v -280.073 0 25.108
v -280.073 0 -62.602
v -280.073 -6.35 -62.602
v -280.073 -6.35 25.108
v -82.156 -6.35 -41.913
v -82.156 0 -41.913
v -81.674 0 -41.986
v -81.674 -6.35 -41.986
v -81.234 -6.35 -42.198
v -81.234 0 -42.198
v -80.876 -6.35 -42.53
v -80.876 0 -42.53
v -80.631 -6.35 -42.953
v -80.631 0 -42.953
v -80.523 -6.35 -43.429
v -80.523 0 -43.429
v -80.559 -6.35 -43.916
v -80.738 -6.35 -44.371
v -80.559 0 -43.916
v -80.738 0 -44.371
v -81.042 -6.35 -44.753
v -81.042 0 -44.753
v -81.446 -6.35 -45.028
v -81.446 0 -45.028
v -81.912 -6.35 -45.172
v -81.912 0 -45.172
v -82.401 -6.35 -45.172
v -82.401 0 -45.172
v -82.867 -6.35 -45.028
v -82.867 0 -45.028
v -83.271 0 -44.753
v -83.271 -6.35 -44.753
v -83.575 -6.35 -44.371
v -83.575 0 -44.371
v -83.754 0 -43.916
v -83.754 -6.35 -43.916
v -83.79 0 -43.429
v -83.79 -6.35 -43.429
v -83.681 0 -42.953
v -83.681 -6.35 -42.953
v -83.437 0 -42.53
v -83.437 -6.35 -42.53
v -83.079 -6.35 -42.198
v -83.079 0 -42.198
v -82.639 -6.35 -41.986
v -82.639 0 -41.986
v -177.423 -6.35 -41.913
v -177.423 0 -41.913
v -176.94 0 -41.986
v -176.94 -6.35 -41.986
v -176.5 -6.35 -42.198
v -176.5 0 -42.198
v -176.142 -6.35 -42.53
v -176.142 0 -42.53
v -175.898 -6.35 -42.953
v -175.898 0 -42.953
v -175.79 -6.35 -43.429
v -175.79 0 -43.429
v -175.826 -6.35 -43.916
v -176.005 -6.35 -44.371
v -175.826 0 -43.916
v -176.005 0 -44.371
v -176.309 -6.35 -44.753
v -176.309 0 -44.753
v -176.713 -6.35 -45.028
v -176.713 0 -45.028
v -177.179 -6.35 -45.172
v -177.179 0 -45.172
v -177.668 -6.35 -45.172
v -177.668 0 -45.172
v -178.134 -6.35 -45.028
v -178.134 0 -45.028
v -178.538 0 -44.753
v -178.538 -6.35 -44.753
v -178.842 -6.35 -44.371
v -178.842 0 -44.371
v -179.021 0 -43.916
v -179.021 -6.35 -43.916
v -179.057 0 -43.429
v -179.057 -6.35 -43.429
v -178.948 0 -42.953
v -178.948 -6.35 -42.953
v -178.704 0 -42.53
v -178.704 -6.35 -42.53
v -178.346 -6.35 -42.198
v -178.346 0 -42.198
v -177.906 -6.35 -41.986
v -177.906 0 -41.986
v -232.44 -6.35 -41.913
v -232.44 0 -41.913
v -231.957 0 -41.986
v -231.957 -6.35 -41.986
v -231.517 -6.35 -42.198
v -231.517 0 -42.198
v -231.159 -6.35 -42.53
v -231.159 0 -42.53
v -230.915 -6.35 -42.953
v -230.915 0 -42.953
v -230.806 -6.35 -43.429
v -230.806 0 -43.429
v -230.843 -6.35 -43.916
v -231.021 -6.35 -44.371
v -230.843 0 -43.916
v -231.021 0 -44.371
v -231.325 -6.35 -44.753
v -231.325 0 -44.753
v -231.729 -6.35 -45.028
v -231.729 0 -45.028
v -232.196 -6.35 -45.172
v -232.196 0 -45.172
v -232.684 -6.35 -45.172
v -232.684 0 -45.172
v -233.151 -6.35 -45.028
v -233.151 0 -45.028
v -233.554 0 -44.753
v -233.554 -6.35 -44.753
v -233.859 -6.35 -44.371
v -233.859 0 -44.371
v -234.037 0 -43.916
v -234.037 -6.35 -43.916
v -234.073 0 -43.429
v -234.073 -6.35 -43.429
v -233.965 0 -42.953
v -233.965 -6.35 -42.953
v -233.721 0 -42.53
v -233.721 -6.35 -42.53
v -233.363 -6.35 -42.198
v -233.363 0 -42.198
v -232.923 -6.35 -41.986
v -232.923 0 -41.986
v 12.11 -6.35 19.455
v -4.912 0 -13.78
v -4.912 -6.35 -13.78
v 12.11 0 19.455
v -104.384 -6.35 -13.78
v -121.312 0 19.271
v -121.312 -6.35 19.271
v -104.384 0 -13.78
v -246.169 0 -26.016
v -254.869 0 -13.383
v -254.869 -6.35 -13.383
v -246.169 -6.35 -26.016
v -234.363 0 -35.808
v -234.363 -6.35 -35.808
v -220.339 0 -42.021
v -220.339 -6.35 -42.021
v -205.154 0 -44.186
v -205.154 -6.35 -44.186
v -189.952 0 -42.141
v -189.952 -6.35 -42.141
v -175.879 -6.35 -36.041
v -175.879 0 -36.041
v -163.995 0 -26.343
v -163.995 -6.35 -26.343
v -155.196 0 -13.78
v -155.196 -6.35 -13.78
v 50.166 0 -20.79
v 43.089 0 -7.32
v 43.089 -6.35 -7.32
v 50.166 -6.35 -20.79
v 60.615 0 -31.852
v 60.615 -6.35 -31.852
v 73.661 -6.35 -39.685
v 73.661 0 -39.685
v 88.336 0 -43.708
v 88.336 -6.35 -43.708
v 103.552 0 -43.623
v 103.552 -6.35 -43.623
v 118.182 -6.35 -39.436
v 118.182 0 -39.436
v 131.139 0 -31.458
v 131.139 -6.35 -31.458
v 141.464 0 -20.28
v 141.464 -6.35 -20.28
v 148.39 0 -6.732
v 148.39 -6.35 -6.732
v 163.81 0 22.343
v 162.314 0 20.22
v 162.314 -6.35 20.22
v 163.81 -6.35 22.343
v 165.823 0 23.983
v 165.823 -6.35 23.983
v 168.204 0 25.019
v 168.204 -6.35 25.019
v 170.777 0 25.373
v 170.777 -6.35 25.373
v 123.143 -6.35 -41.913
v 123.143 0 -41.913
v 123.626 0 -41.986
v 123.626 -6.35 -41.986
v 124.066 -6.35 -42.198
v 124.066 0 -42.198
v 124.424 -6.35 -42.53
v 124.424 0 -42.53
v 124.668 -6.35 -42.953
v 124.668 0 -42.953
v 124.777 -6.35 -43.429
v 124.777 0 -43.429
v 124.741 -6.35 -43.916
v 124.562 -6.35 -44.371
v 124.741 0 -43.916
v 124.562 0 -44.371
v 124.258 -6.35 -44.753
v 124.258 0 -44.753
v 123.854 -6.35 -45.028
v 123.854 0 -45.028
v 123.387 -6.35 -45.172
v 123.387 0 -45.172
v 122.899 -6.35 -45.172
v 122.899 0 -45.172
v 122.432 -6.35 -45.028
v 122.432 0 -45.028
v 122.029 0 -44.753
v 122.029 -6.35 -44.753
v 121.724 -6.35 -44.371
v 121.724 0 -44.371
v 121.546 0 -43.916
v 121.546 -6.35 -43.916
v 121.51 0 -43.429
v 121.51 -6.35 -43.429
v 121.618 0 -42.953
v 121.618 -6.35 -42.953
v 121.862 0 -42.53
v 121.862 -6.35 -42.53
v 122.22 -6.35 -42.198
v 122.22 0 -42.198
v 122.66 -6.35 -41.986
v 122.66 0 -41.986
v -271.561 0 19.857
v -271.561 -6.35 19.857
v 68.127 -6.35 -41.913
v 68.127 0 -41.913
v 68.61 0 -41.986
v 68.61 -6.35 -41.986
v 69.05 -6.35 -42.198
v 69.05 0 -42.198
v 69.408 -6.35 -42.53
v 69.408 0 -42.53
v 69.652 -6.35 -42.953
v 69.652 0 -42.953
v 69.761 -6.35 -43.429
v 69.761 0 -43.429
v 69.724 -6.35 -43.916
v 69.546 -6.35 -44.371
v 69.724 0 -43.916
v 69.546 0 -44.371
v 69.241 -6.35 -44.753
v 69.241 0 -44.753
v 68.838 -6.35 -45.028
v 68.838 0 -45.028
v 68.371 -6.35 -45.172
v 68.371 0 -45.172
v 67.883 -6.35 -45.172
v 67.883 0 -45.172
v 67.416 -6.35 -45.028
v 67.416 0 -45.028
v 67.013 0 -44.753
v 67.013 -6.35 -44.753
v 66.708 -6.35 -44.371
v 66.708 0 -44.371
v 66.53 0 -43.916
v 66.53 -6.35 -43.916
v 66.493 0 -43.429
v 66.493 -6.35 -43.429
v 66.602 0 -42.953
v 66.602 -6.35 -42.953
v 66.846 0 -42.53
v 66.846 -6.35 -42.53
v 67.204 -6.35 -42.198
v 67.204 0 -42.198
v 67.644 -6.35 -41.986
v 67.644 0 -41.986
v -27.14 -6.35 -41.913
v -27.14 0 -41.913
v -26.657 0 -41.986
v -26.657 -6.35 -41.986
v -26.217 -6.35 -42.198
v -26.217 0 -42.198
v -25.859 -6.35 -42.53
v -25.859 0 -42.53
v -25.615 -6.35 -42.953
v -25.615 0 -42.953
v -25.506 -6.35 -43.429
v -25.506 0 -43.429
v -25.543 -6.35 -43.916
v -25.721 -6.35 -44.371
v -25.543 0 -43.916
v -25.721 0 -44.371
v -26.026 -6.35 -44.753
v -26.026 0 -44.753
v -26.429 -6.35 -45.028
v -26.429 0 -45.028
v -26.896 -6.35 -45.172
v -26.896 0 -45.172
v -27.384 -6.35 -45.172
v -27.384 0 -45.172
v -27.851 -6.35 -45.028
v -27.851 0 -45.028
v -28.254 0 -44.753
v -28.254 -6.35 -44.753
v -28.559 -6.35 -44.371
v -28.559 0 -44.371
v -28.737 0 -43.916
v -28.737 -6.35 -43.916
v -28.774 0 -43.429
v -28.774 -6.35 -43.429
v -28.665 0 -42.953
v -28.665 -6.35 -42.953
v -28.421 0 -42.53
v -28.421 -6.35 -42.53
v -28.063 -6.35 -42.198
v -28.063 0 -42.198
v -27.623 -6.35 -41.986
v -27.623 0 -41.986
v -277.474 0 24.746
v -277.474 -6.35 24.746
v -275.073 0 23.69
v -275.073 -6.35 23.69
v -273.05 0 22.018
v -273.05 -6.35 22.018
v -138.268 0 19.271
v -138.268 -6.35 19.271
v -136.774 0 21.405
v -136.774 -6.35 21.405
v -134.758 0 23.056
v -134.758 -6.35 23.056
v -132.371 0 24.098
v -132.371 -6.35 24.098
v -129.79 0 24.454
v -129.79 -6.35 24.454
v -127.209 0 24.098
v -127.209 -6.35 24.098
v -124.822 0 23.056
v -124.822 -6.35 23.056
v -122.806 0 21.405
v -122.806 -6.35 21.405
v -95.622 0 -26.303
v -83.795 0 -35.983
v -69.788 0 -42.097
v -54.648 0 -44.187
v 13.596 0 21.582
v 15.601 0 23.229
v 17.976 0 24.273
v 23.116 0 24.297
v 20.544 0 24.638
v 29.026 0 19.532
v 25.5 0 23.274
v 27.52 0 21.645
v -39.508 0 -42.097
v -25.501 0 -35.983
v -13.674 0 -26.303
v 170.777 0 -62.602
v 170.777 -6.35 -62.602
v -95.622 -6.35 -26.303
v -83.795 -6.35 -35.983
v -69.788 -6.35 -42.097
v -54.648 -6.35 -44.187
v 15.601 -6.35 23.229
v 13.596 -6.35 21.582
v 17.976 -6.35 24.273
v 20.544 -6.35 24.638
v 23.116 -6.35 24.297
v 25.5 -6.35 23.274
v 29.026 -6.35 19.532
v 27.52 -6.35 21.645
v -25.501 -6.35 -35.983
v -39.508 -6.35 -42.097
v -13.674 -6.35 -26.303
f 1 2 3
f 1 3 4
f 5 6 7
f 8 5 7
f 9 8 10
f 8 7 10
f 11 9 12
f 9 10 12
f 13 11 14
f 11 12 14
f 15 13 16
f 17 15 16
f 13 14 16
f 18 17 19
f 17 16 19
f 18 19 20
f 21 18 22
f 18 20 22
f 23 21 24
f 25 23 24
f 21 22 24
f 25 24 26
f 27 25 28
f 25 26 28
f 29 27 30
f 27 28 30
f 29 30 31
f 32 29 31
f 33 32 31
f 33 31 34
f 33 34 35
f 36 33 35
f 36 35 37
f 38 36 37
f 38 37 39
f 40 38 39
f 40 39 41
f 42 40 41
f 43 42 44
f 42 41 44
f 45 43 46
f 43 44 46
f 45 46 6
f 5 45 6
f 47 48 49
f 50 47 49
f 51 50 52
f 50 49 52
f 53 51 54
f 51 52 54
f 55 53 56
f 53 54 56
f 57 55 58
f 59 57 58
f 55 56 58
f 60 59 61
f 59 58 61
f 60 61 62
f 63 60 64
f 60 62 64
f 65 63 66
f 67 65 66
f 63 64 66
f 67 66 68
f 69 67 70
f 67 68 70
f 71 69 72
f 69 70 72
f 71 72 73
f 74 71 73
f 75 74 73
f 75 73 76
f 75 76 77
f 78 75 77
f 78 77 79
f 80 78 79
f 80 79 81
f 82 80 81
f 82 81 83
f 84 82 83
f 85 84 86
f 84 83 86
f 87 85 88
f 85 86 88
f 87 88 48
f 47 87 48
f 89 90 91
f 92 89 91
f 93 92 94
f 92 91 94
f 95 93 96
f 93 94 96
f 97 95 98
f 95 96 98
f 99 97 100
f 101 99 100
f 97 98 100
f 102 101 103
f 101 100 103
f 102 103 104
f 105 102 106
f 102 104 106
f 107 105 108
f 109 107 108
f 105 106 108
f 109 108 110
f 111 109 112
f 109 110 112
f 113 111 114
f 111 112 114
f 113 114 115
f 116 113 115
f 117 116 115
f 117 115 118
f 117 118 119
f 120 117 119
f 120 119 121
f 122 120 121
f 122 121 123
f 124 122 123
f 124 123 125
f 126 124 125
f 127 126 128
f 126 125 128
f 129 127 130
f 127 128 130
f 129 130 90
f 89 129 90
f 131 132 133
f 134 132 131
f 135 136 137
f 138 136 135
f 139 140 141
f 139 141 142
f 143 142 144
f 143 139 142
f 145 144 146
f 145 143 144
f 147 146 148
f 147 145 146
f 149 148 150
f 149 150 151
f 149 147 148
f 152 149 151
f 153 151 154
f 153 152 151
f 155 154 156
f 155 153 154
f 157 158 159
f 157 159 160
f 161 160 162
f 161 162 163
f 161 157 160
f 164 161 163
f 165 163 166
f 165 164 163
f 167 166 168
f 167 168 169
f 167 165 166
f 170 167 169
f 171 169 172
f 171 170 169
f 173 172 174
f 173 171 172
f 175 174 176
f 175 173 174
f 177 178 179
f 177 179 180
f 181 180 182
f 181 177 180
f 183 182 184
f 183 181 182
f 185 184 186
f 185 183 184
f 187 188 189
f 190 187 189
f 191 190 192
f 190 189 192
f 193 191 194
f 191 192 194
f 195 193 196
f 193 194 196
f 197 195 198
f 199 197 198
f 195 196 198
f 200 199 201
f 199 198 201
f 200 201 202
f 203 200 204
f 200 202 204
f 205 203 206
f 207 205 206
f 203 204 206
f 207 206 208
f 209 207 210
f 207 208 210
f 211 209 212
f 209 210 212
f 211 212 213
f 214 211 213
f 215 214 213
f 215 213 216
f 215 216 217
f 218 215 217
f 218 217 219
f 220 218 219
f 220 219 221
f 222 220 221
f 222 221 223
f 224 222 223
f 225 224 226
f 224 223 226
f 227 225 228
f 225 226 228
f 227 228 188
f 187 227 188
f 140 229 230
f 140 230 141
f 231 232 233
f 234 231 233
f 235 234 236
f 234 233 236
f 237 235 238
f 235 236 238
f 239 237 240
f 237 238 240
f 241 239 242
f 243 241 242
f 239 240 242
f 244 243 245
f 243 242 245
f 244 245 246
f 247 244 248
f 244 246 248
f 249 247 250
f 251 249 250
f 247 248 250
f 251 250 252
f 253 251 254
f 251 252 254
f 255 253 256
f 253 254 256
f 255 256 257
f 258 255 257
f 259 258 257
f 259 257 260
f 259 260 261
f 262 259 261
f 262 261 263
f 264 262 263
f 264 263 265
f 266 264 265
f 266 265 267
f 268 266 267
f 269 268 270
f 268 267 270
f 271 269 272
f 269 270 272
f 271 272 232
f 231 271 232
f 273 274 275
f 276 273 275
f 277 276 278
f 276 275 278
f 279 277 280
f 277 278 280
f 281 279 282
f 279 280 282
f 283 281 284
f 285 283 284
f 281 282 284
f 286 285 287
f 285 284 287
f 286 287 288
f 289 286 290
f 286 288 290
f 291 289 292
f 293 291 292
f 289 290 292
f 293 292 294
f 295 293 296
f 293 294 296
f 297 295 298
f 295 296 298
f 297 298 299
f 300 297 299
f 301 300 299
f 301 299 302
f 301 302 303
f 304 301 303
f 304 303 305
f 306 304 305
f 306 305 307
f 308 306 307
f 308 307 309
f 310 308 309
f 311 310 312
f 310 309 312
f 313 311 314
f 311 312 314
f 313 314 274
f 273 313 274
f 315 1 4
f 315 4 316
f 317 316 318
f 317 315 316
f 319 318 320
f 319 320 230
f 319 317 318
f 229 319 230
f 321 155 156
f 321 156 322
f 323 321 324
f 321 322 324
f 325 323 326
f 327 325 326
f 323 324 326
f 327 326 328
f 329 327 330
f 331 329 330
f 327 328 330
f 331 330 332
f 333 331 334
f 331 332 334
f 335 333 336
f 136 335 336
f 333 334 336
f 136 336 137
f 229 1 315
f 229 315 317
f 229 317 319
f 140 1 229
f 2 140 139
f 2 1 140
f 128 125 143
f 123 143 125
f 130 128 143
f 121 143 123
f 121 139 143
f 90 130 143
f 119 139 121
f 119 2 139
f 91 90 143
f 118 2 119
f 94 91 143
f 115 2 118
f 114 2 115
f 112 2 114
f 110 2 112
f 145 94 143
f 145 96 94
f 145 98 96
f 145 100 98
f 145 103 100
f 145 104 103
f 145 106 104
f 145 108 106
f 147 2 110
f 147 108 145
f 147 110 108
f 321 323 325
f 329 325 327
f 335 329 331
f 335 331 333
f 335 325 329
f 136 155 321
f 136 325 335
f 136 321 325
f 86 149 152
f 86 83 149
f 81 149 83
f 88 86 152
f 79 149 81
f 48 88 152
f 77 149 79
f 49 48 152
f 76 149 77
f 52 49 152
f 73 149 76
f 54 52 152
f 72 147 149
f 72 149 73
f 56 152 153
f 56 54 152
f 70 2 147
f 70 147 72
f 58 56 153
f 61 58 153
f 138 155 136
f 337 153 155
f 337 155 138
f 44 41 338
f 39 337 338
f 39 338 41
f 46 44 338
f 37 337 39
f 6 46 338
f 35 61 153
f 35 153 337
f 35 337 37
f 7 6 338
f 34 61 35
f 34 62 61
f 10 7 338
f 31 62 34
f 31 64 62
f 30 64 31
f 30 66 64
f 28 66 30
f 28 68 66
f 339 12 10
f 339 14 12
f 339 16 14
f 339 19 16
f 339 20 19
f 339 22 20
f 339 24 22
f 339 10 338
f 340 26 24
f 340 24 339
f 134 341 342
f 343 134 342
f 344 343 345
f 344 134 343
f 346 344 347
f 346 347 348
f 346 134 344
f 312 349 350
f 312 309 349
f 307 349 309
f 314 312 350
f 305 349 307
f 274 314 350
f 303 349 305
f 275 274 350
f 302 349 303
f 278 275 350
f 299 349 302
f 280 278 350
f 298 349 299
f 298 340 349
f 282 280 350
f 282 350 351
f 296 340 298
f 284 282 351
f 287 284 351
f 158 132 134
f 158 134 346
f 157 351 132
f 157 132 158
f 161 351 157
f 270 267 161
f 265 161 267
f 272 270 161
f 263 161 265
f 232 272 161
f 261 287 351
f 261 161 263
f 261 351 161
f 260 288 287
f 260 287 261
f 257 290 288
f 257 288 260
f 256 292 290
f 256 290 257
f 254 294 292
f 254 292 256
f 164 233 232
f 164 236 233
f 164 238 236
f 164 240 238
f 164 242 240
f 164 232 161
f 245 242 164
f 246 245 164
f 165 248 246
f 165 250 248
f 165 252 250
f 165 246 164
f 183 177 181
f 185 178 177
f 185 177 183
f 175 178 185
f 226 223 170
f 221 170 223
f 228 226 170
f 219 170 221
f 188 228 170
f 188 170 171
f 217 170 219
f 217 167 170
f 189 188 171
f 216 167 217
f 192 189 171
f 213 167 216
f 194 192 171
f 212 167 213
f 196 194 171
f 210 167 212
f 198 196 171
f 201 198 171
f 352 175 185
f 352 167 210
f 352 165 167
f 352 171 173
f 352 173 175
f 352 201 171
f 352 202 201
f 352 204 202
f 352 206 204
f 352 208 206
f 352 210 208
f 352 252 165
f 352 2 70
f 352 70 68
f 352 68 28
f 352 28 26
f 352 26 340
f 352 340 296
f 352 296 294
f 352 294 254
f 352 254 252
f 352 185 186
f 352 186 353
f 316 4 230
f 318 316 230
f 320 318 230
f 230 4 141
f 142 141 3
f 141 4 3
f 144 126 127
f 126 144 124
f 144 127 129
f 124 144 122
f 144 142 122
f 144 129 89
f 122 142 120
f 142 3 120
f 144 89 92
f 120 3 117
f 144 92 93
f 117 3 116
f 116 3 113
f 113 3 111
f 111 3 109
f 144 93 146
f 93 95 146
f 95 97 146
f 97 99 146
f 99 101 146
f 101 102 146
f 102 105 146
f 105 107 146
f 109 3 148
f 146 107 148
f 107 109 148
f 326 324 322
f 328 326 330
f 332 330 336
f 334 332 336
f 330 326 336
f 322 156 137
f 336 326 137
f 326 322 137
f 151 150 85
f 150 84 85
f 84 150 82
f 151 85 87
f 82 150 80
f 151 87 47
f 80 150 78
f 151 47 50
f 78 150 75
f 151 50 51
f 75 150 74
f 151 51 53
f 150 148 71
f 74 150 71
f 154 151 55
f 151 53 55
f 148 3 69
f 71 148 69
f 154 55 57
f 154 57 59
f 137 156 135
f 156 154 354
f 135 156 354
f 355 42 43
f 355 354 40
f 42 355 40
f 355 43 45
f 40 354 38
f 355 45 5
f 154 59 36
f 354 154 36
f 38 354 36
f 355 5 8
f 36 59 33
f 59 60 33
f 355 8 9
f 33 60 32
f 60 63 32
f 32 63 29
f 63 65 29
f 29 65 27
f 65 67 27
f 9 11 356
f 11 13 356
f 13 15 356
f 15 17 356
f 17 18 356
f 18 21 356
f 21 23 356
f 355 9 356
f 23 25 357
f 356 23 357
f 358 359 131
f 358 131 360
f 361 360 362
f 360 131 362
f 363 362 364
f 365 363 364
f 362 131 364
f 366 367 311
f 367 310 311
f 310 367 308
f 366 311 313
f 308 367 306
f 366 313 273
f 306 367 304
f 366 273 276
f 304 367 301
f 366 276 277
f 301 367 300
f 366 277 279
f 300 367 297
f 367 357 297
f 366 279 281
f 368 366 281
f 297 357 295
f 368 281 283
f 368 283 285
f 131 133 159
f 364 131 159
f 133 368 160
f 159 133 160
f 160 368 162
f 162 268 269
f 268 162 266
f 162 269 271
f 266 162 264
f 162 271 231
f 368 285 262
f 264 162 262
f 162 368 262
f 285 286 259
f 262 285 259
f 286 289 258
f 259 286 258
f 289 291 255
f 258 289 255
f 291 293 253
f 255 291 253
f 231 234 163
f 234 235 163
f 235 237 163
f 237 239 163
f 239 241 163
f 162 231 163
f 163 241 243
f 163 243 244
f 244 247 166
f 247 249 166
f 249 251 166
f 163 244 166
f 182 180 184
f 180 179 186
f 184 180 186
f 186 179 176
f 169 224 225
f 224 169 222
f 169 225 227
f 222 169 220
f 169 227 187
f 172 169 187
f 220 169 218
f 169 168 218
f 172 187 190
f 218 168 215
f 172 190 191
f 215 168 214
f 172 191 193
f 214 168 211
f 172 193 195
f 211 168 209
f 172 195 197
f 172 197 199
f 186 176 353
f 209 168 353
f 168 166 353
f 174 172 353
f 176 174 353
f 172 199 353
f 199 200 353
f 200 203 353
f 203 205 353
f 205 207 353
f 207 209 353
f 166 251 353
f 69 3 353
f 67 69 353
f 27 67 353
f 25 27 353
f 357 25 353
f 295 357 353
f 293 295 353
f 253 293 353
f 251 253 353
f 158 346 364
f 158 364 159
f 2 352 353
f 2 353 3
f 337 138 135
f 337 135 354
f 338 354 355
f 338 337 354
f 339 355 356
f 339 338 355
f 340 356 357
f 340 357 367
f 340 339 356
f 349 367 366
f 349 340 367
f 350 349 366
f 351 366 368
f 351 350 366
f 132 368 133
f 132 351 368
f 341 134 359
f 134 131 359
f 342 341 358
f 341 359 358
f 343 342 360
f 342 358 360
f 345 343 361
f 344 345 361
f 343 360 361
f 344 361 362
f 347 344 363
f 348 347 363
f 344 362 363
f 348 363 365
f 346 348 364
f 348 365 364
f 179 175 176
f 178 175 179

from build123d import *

# Parameters (mm, degrees)
SKETCH1_R           = 1.6383
BOSS_EXTRUDE1_DEPTH = 6.35
FILLET3_R           = 9.525


with BuildPart() as part:
    # Sketch1 → Boss-Extrude1 (new body)
    with BuildSketch(Plane(origin=(0, 0, 0), x_dir=(1, 0, 0), z_dir=(0, 1, 0))):
        with BuildLine():
            Line((-155.195517325, 13.78007871), (-129.789904869, -35.823423436))
            Line((-129.789904869, -35.823423436), (-104.384292413, 13.78007871))
            ThreePointArc((-104.384292413, 13.78007871), (-54.648238202, 44.186576564), (-4.912183992, 13.78007871))
            Line((-4.912183992, 13.78007871), (20.493428464, -35.823423436))
            Line((20.493428464, -35.823423436), (43.089138197, 7.319646013))
            ThreePointArc((43.089138197, 7.319646013), (95.947099994, 44.185705521), (148.390090675, 6.731691085))
            Line((148.390090675, 6.731691085), (162.314428993, -20.219790589))
            ThreePointArc((162.314428993, -20.219790589), (165.822867077, -23.983160647), (170.776761798, -25.372771775))
            Line((170.776761798, -25.372771775), (170.776761798, 62.601576564))
            Line((170.776761798, 62.601576564), (-280.073238202, 62.601576564))
            Line((-280.073238202, 62.601576564), (-280.073238202, -25.107798436))
            ThreePointArc((-280.073238202, -25.107798436), (-275.072672567, -23.689583762), (-271.561214661, -19.857266851))
            Line((-271.561214661, -19.857266851), (-254.868776311, 13.383457934))
            ThreePointArc((-254.868776311, 13.383457934), (-205.153928001, 44.186134164), (-155.195517325, 13.78007871))
        make_face()
        with Locations(Location((-232.439771536, 43.551576564, 0), (0, 0, 270))):
            Circle(SKETCH1_R, mode=Mode.SUBTRACT)
        with Locations(Location((-177.423371536, 43.551576564, 0), (0, 0, 270))):
            Circle(SKETCH1_R, mode=Mode.SUBTRACT)
        with Locations(Location((-27.140038202, 43.551576564, 0), (0, 0, 270))):
            Circle(SKETCH1_R, mode=Mode.SUBTRACT)
        with Locations(Location((-82.156438202, 43.551576564, 0), (0, 0, 270))):
            Circle(SKETCH1_R, mode=Mode.SUBTRACT)
        with Locations(Location((123.143295131, 43.551576564, 0), (0, 0, 270))):
            Circle(SKETCH1_R, mode=Mode.SUBTRACT)
        with Locations(Location((68.126895131, 43.551576564, 0), (0, 0, 270))):
            Circle(SKETCH1_R, mode=Mode.SUBTRACT)
    extrude(amount=-BOSS_EXTRUDE1_DEPTH)

    # Fillet3
    fillet3_edges = [part.edges().sort_by_distance(p)[0] for p in [
        (20.493428464, -3.175, 35.823423436),
        (-129.789904869, -3.175, 35.823423436),
    ]]
    fillet(fillet3_edges, radius=FILLET3_R)


solid = part.part
